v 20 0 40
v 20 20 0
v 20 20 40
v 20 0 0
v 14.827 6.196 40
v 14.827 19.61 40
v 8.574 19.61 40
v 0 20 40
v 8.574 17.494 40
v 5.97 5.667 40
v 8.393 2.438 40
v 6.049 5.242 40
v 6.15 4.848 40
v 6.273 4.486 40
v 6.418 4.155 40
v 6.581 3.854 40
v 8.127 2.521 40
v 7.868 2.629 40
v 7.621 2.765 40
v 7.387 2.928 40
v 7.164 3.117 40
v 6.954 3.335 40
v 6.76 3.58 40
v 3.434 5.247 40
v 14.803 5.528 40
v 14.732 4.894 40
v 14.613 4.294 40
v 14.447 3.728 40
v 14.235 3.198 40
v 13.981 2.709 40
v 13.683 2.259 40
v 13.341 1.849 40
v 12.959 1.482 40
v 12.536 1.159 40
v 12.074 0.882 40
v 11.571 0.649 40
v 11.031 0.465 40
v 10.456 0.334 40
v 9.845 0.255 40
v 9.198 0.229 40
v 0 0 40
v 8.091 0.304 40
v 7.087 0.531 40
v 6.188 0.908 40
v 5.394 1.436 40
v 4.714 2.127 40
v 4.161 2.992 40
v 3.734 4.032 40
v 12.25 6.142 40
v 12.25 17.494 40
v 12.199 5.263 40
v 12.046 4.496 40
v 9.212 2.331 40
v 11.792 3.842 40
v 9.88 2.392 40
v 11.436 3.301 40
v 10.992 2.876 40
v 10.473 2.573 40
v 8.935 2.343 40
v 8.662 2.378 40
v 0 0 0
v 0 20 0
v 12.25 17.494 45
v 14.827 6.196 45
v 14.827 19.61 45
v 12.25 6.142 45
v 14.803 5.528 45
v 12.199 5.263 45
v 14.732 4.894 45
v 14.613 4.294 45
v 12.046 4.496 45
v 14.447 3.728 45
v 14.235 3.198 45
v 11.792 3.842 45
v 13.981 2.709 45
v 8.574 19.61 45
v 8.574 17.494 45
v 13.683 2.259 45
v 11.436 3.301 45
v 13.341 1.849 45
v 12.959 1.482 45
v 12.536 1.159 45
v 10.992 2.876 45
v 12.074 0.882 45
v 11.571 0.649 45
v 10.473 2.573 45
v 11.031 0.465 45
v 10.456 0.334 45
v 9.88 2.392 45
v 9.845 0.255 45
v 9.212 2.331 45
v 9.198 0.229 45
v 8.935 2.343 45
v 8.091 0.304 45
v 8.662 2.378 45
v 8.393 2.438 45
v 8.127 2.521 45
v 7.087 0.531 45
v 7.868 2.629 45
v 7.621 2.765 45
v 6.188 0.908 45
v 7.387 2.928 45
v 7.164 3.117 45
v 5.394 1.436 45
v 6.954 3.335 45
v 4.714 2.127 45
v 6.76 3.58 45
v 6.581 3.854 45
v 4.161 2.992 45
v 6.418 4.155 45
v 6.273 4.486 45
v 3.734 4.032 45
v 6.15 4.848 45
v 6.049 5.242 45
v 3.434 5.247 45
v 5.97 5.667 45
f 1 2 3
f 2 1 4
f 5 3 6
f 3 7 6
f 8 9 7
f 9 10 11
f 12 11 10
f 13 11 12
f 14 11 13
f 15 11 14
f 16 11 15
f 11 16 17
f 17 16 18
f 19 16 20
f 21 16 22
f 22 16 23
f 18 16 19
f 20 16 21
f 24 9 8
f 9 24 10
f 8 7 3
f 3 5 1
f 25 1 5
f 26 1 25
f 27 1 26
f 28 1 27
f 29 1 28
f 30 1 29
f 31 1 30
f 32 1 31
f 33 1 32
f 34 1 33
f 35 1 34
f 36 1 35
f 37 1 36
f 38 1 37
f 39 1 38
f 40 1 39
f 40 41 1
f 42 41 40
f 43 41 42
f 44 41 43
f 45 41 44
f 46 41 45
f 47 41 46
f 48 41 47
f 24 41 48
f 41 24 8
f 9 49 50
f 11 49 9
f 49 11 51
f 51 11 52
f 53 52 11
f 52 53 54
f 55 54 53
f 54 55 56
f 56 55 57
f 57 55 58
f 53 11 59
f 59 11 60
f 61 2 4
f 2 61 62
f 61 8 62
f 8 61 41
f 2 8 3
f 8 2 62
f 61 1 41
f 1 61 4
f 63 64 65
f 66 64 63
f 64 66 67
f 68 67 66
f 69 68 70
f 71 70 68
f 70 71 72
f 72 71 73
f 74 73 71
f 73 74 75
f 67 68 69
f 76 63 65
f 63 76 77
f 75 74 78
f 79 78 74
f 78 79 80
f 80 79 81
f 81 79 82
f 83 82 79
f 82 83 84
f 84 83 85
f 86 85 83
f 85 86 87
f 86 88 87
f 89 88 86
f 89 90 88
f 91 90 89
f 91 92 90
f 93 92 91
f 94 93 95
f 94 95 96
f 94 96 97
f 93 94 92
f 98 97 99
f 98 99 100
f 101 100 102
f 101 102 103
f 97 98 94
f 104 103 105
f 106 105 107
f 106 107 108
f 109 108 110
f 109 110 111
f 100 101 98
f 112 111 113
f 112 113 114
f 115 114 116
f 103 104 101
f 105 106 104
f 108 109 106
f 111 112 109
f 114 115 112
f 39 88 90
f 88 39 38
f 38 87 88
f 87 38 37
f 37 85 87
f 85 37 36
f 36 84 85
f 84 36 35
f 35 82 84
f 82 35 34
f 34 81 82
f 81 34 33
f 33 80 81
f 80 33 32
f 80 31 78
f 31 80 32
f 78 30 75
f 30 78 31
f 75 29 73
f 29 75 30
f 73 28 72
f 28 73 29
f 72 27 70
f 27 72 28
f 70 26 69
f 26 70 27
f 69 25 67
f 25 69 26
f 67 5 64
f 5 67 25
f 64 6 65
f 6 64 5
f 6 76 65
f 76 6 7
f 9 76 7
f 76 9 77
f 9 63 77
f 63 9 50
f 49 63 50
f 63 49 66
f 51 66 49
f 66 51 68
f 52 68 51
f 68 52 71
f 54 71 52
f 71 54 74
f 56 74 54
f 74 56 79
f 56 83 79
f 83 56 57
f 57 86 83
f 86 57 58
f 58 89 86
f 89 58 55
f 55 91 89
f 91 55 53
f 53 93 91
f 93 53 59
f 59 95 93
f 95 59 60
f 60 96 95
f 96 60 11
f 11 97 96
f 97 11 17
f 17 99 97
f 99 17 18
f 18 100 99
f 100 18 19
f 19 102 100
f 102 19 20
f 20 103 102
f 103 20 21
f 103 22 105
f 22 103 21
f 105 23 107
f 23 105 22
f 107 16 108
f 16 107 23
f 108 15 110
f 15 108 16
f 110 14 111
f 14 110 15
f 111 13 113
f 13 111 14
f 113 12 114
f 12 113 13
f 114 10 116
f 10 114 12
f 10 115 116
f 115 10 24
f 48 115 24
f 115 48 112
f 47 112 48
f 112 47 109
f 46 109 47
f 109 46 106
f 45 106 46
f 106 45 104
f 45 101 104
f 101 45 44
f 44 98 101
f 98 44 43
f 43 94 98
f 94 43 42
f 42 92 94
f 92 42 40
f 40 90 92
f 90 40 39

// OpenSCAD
cube([20, 20, 40]);
translate([3, 0.5, 40]){
    linear_extrude(5){
        text("J", size=20);
    }
}
